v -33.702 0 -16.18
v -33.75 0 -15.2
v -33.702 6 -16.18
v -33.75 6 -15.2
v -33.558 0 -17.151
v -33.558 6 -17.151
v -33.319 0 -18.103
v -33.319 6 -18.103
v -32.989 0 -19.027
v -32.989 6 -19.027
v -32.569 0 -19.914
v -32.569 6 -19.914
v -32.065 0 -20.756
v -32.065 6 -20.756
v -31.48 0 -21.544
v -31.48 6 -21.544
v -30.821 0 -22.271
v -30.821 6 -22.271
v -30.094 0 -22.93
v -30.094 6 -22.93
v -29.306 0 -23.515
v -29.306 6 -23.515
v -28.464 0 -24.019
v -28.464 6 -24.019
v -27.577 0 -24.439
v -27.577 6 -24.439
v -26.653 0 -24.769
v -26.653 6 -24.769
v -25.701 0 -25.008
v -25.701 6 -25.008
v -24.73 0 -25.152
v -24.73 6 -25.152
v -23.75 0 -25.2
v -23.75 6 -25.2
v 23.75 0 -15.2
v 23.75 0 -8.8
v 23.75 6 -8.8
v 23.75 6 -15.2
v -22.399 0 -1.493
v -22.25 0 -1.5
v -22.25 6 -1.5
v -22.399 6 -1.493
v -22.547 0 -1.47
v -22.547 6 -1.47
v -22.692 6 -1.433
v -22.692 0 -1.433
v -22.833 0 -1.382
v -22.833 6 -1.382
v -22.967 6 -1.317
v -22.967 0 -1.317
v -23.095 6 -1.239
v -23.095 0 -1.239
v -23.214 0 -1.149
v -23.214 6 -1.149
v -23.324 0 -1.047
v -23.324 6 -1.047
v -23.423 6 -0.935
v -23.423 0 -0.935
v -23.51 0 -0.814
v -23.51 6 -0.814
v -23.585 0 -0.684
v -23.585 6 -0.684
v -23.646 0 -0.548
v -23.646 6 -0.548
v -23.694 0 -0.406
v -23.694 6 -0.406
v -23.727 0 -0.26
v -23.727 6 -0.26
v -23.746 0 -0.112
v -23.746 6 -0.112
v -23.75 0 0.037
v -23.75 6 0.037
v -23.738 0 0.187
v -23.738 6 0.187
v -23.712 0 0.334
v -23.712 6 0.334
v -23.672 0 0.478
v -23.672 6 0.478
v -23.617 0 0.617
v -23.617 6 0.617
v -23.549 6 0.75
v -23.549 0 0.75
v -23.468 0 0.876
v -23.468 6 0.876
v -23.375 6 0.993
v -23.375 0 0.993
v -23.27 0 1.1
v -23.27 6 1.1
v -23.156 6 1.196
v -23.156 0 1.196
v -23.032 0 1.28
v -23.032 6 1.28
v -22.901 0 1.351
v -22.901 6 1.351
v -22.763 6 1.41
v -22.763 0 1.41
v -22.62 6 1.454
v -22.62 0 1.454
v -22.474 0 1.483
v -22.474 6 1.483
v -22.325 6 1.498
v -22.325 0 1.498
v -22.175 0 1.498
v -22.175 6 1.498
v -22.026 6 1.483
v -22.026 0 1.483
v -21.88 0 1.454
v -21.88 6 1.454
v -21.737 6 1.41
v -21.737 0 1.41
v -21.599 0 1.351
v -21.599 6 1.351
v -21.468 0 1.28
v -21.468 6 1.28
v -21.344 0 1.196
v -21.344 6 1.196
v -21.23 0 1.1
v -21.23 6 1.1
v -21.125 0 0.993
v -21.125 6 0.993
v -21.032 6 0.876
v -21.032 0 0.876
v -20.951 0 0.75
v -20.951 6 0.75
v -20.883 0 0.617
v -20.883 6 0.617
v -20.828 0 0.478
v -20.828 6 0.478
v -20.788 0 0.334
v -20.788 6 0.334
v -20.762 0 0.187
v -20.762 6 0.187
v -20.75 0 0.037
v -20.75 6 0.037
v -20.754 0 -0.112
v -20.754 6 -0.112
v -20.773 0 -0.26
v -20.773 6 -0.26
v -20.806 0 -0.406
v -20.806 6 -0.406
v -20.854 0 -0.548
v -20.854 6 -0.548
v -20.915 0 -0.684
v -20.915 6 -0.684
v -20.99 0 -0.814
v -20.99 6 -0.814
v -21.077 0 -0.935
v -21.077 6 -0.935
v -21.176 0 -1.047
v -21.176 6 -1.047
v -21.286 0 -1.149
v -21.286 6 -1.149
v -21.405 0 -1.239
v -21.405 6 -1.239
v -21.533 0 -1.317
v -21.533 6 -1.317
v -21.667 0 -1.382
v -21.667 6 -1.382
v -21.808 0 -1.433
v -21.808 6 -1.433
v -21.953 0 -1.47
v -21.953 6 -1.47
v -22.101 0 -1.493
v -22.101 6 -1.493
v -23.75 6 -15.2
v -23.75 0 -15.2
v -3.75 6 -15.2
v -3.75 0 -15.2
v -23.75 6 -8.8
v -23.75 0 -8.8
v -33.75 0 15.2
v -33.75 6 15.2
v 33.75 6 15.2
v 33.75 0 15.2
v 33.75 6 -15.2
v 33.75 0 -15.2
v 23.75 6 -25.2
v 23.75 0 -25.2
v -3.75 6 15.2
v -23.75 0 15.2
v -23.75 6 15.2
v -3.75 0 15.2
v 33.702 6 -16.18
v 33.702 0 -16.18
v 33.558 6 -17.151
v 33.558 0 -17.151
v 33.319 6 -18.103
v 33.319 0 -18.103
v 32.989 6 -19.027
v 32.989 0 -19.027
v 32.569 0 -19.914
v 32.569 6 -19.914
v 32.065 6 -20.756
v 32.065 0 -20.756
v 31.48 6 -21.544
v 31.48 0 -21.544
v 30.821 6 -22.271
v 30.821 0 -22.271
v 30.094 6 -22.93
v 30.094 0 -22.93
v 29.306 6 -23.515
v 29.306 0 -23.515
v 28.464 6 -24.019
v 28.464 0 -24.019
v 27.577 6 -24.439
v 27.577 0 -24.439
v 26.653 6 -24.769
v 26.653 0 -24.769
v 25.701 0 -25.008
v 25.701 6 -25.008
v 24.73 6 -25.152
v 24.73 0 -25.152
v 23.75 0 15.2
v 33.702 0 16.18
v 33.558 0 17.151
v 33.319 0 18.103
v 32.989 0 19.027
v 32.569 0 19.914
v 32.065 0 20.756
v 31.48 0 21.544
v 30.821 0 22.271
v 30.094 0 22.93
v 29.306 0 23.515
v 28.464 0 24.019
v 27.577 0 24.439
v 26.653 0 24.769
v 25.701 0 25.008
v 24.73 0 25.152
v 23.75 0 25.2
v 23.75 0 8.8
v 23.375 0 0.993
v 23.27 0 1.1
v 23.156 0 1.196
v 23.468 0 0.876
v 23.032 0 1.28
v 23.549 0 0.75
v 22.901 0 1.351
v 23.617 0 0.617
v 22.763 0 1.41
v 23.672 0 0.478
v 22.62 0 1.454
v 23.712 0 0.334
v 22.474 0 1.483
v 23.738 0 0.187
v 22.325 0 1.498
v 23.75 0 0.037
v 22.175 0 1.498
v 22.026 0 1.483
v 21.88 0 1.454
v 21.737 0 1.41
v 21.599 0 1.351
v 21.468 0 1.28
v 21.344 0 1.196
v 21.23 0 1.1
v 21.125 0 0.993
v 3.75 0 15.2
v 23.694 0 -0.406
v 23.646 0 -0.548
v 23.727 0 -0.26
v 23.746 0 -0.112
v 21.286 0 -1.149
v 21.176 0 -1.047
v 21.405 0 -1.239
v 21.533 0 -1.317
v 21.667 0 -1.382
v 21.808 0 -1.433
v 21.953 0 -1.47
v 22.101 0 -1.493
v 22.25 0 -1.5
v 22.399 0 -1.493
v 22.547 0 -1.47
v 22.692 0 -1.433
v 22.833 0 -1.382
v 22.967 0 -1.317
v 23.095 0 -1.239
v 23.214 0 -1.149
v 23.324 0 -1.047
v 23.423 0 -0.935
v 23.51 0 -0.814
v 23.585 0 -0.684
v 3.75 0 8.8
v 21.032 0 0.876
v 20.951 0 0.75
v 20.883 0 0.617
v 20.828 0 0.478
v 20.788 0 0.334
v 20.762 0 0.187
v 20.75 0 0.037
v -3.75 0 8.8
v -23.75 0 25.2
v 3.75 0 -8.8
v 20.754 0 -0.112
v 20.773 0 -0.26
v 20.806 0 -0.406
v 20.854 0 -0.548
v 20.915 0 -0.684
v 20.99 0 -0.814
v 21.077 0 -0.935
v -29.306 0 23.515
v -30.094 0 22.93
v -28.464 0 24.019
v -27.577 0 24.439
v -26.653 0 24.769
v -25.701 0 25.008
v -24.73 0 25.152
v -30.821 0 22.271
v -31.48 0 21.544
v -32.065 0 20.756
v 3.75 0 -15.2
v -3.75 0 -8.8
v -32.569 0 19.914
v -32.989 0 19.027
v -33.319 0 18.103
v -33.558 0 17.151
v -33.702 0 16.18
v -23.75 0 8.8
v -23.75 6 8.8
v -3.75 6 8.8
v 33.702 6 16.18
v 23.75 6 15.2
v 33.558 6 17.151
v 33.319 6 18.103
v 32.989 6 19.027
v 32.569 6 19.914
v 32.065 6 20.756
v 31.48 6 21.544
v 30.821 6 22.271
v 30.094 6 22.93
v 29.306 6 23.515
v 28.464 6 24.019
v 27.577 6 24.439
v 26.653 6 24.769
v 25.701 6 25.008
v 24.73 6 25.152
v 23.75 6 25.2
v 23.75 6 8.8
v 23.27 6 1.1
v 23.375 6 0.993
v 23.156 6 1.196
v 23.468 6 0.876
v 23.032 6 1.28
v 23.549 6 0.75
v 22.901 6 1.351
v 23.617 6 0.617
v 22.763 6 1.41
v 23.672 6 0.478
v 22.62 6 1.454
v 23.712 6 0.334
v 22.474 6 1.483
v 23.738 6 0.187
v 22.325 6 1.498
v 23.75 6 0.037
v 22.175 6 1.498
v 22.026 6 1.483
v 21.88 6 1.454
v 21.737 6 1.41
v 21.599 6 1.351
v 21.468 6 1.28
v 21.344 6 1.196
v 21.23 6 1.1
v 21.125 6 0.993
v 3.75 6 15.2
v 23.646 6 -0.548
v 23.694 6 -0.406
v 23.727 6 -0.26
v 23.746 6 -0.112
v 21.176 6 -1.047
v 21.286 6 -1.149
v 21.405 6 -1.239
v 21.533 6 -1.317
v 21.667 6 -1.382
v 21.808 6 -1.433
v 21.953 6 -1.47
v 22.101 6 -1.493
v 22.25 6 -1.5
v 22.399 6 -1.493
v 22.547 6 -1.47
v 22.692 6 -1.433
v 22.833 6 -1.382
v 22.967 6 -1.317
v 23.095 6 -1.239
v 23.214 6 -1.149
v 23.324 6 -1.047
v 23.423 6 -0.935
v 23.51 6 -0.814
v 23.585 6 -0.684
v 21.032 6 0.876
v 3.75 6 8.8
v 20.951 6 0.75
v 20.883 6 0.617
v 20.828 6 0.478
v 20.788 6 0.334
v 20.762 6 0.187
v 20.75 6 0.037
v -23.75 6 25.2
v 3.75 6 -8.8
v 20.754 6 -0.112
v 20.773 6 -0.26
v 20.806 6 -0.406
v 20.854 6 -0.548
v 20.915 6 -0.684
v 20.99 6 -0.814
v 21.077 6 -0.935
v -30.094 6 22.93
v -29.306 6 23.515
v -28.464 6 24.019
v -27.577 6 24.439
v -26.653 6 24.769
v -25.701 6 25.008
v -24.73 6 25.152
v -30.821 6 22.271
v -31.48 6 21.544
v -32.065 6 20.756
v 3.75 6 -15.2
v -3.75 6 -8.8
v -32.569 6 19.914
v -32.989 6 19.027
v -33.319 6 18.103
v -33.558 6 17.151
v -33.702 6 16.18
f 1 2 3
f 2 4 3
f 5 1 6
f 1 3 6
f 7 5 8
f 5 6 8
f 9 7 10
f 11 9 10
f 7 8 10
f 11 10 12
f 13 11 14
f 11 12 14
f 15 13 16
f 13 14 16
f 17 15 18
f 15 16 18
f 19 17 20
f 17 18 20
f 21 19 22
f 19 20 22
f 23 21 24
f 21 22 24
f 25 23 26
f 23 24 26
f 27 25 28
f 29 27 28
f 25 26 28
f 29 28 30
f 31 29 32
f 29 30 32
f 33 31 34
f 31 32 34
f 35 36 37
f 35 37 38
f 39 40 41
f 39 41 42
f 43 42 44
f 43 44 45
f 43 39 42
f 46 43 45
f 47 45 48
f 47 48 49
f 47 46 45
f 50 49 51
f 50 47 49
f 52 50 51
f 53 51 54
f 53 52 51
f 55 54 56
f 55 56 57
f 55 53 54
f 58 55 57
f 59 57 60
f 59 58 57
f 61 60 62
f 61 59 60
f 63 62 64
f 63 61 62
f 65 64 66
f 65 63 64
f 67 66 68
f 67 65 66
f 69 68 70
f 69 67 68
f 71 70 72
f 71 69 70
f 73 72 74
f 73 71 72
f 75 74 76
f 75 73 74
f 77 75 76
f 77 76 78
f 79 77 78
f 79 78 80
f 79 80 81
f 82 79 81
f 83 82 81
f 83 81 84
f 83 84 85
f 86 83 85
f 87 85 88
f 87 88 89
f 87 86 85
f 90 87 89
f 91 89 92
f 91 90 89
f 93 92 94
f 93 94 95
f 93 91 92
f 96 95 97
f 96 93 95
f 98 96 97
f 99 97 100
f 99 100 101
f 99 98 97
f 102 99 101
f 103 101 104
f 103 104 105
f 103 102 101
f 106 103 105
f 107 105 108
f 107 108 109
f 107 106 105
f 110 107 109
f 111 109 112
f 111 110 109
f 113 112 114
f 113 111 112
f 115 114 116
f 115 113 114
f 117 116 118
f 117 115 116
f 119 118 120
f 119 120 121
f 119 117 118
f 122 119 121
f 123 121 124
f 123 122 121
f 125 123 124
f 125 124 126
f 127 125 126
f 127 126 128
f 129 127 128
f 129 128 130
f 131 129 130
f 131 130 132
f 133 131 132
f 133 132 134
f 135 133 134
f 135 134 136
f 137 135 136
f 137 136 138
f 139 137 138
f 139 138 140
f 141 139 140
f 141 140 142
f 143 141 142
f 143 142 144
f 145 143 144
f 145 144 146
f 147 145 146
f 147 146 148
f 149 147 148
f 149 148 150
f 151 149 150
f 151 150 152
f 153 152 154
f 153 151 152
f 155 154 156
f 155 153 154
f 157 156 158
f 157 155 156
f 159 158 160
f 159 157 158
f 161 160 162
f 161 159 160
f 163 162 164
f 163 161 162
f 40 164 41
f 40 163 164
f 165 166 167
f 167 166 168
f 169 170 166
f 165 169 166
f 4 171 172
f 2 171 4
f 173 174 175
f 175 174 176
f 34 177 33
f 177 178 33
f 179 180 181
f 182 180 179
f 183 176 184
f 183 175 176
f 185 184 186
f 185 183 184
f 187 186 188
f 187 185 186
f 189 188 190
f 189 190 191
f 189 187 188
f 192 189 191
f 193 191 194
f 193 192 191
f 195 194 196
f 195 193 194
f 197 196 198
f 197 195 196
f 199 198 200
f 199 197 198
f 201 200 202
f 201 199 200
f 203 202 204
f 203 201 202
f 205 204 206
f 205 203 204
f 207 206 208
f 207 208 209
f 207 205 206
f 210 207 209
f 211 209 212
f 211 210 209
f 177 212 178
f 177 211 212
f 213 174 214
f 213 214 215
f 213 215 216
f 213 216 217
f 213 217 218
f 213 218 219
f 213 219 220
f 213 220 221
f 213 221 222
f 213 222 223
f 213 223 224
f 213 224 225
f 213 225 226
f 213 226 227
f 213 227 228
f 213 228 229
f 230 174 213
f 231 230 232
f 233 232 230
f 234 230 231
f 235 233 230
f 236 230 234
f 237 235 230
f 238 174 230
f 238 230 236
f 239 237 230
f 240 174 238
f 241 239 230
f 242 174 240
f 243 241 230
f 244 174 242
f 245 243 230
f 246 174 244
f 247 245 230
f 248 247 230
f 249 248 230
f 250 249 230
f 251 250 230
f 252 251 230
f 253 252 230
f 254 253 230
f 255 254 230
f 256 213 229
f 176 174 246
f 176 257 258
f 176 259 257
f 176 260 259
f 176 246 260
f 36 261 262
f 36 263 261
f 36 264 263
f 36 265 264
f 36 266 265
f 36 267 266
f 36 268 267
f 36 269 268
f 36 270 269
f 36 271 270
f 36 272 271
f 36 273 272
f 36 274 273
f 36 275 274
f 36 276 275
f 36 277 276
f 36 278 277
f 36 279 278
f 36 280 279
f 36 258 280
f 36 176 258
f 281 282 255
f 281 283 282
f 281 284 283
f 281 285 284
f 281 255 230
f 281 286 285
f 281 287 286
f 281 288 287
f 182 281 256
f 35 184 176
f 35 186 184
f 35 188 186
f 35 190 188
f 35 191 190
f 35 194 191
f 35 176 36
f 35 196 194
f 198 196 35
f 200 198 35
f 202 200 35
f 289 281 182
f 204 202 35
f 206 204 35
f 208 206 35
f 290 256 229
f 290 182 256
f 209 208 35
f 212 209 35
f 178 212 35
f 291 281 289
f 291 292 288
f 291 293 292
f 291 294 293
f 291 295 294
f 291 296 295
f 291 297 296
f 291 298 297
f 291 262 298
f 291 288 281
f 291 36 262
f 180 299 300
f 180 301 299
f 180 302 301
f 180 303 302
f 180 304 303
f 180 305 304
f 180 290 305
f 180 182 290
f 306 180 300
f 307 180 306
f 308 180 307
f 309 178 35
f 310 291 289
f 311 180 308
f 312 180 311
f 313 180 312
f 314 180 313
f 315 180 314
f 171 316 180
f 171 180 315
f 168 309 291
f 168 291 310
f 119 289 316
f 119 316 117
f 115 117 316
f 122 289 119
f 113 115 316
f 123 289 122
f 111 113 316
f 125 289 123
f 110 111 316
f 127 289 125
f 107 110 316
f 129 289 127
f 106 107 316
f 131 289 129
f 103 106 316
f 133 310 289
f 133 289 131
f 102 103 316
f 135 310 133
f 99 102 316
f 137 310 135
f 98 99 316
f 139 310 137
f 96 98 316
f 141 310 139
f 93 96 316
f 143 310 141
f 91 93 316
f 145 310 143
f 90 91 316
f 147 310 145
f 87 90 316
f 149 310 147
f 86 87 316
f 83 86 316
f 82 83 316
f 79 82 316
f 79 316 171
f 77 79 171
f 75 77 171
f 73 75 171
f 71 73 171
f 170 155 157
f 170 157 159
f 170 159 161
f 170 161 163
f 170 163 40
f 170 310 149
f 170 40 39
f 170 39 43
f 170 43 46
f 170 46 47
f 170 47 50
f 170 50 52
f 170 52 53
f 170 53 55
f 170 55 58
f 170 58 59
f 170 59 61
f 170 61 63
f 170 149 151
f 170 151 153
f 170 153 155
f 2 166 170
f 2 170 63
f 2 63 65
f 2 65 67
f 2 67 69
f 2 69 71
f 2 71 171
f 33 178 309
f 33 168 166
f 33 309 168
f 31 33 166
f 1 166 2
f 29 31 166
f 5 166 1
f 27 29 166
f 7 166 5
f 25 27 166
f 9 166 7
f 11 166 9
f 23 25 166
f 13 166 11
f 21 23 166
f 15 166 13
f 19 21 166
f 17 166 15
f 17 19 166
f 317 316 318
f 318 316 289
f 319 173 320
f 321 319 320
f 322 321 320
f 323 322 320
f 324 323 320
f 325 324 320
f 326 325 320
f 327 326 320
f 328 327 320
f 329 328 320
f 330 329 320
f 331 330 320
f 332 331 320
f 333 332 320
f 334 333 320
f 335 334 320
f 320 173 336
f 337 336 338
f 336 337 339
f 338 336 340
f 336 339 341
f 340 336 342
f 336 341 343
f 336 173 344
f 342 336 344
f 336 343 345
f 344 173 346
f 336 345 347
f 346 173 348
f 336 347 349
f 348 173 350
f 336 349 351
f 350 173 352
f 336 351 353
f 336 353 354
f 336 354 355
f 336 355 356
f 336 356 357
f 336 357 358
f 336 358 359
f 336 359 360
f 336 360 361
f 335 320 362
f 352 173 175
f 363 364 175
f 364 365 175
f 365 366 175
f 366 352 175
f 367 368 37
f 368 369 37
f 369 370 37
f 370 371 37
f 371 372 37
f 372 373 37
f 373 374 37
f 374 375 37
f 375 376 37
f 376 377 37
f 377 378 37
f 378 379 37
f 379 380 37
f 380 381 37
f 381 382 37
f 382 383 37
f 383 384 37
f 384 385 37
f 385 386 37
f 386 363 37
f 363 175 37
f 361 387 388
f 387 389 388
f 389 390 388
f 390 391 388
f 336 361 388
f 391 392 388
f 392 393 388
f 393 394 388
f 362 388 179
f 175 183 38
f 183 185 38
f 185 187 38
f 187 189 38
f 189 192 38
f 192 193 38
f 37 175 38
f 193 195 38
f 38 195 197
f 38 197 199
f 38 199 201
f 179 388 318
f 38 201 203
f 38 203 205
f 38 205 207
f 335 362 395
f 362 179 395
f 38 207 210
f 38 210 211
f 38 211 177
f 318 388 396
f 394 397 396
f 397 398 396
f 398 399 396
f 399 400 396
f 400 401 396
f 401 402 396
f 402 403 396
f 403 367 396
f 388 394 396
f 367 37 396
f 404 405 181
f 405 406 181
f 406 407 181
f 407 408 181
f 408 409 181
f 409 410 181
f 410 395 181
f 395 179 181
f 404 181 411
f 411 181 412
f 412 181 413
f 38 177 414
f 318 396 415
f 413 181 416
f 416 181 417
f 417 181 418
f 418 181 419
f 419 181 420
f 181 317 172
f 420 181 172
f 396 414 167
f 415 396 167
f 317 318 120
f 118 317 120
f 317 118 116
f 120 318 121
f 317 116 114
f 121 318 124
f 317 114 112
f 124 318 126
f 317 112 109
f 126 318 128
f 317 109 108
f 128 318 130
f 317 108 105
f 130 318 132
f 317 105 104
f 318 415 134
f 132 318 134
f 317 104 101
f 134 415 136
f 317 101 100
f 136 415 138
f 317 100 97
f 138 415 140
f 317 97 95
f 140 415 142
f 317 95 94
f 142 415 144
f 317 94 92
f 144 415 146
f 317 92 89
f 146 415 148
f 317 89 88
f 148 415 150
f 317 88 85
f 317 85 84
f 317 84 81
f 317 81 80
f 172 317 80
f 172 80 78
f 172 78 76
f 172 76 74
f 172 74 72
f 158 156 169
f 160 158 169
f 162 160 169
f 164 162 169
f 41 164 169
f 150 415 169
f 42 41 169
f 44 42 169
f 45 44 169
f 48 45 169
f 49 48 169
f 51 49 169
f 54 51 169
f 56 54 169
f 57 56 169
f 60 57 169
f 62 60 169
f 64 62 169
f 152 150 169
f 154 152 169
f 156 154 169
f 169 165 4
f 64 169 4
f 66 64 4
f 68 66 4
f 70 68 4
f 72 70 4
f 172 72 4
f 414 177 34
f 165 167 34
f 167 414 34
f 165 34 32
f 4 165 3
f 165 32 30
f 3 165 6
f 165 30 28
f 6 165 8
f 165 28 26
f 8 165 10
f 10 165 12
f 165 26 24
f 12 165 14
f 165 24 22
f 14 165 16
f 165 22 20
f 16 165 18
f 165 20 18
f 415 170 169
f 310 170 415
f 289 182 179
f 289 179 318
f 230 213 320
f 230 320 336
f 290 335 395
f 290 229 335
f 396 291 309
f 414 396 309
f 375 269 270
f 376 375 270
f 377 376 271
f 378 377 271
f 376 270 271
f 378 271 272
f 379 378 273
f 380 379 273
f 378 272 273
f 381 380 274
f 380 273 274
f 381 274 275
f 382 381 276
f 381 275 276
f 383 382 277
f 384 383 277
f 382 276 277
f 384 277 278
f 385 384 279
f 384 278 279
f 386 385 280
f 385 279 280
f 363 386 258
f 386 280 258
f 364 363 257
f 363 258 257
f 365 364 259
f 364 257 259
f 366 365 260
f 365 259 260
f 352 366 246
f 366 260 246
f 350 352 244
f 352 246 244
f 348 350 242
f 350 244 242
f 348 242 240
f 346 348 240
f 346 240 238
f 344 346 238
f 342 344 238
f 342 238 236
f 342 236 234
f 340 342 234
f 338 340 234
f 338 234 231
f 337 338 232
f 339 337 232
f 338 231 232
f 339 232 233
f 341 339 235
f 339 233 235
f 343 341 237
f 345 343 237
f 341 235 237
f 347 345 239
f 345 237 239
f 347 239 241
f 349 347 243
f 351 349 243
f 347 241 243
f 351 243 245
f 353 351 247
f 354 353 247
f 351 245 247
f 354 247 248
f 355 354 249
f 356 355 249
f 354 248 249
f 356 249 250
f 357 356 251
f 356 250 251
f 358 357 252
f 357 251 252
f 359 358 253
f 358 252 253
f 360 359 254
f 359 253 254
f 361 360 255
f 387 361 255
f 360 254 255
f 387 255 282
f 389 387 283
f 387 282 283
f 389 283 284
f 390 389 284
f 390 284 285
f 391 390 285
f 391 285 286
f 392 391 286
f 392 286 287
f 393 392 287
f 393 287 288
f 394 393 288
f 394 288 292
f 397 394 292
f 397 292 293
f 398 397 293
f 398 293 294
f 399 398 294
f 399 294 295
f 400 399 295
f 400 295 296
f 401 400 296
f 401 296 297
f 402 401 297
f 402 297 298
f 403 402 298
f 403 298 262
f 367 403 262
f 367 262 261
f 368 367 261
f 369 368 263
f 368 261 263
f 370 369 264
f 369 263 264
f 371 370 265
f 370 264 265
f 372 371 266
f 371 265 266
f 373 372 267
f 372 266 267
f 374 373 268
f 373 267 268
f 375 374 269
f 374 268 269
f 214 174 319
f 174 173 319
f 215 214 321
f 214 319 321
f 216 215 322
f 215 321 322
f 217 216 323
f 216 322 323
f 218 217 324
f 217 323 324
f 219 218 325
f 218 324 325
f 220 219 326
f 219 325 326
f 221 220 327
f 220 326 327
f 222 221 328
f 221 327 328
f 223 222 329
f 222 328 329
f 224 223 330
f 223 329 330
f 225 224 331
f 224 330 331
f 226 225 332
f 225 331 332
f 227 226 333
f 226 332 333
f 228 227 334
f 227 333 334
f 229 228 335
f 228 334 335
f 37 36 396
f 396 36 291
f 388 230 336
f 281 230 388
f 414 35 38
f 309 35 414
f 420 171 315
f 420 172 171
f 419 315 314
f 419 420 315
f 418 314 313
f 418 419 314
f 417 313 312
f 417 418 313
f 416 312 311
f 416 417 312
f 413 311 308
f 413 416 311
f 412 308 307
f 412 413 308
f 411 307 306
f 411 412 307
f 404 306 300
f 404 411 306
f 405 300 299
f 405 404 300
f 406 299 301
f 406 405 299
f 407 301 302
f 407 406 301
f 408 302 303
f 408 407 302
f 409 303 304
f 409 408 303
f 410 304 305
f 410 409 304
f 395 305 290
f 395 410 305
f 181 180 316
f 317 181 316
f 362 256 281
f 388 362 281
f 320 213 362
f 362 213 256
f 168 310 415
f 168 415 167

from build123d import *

# Parameters (mm, degrees)
SKETCH1_W            = 33.75
SKETCH1_H            = 50.4
SKETCH1_R            = 1.5
SKETCH1_W_2          = 20
SKETCH1_H_2          = 6.4
BOSS_EXTRUDE1_DEPTH  = 6
FILLET1_R            = 10
FILLET1_OF_MIRROR1_R = 10


with BuildPart() as part:
    # Sketch1 → Boss-Extrude1 (new body)
    with BuildSketch(Plane(origin=(0, 0, 0), x_dir=(1, 0, 0), z_dir=(0, 1, 0))):
        with Locations((-16.875, 0)):
            Rectangle(SKETCH1_W, SKETCH1_H)
        with Locations(Location((-22.25, 0, 0), (0, 0, 90))):
            Circle(SKETCH1_R, mode=Mode.SUBTRACT)
        with Locations((-13.75, 12)):
            Rectangle(SKETCH1_W_2, SKETCH1_H_2, mode=Mode.SUBTRACT)
        with Locations((-13.75, -12)):
            Rectangle(SKETCH1_W_2, SKETCH1_H_2, mode=Mode.SUBTRACT)
    boss_extrude1 = extrude(amount=BOSS_EXTRUDE1_DEPTH)

    # Fillet1
    fillet1_edges = [part.edges().sort_by_distance(p)[0] for p in [
        (-33.75, 3, -25.2),
        (-33.75, 3, 25.2),
    ]]
    fillet(fillet1_edges, radius=FILLET1_R)

    # Mirror1: Boss-Extrude1 across plane
    add(boss_extrude1.mirror(Plane(origin=(0, 6, -25.2), x_dir=(0, 0, 1), z_dir=(-1, 0, 0))))

    # Fillet1 of Mirror1
    fillet1_of_mirror1_edges = [part.edges().sort_by_distance(p)[0] for p in [
        (33.75, 3, -25.2),
        (33.75, 3, 25.2),
    ]]
    fillet(fillet1_of_mirror1_edges, radius=FILLET1_OF_MIRROR1_R)


solid = part.part
